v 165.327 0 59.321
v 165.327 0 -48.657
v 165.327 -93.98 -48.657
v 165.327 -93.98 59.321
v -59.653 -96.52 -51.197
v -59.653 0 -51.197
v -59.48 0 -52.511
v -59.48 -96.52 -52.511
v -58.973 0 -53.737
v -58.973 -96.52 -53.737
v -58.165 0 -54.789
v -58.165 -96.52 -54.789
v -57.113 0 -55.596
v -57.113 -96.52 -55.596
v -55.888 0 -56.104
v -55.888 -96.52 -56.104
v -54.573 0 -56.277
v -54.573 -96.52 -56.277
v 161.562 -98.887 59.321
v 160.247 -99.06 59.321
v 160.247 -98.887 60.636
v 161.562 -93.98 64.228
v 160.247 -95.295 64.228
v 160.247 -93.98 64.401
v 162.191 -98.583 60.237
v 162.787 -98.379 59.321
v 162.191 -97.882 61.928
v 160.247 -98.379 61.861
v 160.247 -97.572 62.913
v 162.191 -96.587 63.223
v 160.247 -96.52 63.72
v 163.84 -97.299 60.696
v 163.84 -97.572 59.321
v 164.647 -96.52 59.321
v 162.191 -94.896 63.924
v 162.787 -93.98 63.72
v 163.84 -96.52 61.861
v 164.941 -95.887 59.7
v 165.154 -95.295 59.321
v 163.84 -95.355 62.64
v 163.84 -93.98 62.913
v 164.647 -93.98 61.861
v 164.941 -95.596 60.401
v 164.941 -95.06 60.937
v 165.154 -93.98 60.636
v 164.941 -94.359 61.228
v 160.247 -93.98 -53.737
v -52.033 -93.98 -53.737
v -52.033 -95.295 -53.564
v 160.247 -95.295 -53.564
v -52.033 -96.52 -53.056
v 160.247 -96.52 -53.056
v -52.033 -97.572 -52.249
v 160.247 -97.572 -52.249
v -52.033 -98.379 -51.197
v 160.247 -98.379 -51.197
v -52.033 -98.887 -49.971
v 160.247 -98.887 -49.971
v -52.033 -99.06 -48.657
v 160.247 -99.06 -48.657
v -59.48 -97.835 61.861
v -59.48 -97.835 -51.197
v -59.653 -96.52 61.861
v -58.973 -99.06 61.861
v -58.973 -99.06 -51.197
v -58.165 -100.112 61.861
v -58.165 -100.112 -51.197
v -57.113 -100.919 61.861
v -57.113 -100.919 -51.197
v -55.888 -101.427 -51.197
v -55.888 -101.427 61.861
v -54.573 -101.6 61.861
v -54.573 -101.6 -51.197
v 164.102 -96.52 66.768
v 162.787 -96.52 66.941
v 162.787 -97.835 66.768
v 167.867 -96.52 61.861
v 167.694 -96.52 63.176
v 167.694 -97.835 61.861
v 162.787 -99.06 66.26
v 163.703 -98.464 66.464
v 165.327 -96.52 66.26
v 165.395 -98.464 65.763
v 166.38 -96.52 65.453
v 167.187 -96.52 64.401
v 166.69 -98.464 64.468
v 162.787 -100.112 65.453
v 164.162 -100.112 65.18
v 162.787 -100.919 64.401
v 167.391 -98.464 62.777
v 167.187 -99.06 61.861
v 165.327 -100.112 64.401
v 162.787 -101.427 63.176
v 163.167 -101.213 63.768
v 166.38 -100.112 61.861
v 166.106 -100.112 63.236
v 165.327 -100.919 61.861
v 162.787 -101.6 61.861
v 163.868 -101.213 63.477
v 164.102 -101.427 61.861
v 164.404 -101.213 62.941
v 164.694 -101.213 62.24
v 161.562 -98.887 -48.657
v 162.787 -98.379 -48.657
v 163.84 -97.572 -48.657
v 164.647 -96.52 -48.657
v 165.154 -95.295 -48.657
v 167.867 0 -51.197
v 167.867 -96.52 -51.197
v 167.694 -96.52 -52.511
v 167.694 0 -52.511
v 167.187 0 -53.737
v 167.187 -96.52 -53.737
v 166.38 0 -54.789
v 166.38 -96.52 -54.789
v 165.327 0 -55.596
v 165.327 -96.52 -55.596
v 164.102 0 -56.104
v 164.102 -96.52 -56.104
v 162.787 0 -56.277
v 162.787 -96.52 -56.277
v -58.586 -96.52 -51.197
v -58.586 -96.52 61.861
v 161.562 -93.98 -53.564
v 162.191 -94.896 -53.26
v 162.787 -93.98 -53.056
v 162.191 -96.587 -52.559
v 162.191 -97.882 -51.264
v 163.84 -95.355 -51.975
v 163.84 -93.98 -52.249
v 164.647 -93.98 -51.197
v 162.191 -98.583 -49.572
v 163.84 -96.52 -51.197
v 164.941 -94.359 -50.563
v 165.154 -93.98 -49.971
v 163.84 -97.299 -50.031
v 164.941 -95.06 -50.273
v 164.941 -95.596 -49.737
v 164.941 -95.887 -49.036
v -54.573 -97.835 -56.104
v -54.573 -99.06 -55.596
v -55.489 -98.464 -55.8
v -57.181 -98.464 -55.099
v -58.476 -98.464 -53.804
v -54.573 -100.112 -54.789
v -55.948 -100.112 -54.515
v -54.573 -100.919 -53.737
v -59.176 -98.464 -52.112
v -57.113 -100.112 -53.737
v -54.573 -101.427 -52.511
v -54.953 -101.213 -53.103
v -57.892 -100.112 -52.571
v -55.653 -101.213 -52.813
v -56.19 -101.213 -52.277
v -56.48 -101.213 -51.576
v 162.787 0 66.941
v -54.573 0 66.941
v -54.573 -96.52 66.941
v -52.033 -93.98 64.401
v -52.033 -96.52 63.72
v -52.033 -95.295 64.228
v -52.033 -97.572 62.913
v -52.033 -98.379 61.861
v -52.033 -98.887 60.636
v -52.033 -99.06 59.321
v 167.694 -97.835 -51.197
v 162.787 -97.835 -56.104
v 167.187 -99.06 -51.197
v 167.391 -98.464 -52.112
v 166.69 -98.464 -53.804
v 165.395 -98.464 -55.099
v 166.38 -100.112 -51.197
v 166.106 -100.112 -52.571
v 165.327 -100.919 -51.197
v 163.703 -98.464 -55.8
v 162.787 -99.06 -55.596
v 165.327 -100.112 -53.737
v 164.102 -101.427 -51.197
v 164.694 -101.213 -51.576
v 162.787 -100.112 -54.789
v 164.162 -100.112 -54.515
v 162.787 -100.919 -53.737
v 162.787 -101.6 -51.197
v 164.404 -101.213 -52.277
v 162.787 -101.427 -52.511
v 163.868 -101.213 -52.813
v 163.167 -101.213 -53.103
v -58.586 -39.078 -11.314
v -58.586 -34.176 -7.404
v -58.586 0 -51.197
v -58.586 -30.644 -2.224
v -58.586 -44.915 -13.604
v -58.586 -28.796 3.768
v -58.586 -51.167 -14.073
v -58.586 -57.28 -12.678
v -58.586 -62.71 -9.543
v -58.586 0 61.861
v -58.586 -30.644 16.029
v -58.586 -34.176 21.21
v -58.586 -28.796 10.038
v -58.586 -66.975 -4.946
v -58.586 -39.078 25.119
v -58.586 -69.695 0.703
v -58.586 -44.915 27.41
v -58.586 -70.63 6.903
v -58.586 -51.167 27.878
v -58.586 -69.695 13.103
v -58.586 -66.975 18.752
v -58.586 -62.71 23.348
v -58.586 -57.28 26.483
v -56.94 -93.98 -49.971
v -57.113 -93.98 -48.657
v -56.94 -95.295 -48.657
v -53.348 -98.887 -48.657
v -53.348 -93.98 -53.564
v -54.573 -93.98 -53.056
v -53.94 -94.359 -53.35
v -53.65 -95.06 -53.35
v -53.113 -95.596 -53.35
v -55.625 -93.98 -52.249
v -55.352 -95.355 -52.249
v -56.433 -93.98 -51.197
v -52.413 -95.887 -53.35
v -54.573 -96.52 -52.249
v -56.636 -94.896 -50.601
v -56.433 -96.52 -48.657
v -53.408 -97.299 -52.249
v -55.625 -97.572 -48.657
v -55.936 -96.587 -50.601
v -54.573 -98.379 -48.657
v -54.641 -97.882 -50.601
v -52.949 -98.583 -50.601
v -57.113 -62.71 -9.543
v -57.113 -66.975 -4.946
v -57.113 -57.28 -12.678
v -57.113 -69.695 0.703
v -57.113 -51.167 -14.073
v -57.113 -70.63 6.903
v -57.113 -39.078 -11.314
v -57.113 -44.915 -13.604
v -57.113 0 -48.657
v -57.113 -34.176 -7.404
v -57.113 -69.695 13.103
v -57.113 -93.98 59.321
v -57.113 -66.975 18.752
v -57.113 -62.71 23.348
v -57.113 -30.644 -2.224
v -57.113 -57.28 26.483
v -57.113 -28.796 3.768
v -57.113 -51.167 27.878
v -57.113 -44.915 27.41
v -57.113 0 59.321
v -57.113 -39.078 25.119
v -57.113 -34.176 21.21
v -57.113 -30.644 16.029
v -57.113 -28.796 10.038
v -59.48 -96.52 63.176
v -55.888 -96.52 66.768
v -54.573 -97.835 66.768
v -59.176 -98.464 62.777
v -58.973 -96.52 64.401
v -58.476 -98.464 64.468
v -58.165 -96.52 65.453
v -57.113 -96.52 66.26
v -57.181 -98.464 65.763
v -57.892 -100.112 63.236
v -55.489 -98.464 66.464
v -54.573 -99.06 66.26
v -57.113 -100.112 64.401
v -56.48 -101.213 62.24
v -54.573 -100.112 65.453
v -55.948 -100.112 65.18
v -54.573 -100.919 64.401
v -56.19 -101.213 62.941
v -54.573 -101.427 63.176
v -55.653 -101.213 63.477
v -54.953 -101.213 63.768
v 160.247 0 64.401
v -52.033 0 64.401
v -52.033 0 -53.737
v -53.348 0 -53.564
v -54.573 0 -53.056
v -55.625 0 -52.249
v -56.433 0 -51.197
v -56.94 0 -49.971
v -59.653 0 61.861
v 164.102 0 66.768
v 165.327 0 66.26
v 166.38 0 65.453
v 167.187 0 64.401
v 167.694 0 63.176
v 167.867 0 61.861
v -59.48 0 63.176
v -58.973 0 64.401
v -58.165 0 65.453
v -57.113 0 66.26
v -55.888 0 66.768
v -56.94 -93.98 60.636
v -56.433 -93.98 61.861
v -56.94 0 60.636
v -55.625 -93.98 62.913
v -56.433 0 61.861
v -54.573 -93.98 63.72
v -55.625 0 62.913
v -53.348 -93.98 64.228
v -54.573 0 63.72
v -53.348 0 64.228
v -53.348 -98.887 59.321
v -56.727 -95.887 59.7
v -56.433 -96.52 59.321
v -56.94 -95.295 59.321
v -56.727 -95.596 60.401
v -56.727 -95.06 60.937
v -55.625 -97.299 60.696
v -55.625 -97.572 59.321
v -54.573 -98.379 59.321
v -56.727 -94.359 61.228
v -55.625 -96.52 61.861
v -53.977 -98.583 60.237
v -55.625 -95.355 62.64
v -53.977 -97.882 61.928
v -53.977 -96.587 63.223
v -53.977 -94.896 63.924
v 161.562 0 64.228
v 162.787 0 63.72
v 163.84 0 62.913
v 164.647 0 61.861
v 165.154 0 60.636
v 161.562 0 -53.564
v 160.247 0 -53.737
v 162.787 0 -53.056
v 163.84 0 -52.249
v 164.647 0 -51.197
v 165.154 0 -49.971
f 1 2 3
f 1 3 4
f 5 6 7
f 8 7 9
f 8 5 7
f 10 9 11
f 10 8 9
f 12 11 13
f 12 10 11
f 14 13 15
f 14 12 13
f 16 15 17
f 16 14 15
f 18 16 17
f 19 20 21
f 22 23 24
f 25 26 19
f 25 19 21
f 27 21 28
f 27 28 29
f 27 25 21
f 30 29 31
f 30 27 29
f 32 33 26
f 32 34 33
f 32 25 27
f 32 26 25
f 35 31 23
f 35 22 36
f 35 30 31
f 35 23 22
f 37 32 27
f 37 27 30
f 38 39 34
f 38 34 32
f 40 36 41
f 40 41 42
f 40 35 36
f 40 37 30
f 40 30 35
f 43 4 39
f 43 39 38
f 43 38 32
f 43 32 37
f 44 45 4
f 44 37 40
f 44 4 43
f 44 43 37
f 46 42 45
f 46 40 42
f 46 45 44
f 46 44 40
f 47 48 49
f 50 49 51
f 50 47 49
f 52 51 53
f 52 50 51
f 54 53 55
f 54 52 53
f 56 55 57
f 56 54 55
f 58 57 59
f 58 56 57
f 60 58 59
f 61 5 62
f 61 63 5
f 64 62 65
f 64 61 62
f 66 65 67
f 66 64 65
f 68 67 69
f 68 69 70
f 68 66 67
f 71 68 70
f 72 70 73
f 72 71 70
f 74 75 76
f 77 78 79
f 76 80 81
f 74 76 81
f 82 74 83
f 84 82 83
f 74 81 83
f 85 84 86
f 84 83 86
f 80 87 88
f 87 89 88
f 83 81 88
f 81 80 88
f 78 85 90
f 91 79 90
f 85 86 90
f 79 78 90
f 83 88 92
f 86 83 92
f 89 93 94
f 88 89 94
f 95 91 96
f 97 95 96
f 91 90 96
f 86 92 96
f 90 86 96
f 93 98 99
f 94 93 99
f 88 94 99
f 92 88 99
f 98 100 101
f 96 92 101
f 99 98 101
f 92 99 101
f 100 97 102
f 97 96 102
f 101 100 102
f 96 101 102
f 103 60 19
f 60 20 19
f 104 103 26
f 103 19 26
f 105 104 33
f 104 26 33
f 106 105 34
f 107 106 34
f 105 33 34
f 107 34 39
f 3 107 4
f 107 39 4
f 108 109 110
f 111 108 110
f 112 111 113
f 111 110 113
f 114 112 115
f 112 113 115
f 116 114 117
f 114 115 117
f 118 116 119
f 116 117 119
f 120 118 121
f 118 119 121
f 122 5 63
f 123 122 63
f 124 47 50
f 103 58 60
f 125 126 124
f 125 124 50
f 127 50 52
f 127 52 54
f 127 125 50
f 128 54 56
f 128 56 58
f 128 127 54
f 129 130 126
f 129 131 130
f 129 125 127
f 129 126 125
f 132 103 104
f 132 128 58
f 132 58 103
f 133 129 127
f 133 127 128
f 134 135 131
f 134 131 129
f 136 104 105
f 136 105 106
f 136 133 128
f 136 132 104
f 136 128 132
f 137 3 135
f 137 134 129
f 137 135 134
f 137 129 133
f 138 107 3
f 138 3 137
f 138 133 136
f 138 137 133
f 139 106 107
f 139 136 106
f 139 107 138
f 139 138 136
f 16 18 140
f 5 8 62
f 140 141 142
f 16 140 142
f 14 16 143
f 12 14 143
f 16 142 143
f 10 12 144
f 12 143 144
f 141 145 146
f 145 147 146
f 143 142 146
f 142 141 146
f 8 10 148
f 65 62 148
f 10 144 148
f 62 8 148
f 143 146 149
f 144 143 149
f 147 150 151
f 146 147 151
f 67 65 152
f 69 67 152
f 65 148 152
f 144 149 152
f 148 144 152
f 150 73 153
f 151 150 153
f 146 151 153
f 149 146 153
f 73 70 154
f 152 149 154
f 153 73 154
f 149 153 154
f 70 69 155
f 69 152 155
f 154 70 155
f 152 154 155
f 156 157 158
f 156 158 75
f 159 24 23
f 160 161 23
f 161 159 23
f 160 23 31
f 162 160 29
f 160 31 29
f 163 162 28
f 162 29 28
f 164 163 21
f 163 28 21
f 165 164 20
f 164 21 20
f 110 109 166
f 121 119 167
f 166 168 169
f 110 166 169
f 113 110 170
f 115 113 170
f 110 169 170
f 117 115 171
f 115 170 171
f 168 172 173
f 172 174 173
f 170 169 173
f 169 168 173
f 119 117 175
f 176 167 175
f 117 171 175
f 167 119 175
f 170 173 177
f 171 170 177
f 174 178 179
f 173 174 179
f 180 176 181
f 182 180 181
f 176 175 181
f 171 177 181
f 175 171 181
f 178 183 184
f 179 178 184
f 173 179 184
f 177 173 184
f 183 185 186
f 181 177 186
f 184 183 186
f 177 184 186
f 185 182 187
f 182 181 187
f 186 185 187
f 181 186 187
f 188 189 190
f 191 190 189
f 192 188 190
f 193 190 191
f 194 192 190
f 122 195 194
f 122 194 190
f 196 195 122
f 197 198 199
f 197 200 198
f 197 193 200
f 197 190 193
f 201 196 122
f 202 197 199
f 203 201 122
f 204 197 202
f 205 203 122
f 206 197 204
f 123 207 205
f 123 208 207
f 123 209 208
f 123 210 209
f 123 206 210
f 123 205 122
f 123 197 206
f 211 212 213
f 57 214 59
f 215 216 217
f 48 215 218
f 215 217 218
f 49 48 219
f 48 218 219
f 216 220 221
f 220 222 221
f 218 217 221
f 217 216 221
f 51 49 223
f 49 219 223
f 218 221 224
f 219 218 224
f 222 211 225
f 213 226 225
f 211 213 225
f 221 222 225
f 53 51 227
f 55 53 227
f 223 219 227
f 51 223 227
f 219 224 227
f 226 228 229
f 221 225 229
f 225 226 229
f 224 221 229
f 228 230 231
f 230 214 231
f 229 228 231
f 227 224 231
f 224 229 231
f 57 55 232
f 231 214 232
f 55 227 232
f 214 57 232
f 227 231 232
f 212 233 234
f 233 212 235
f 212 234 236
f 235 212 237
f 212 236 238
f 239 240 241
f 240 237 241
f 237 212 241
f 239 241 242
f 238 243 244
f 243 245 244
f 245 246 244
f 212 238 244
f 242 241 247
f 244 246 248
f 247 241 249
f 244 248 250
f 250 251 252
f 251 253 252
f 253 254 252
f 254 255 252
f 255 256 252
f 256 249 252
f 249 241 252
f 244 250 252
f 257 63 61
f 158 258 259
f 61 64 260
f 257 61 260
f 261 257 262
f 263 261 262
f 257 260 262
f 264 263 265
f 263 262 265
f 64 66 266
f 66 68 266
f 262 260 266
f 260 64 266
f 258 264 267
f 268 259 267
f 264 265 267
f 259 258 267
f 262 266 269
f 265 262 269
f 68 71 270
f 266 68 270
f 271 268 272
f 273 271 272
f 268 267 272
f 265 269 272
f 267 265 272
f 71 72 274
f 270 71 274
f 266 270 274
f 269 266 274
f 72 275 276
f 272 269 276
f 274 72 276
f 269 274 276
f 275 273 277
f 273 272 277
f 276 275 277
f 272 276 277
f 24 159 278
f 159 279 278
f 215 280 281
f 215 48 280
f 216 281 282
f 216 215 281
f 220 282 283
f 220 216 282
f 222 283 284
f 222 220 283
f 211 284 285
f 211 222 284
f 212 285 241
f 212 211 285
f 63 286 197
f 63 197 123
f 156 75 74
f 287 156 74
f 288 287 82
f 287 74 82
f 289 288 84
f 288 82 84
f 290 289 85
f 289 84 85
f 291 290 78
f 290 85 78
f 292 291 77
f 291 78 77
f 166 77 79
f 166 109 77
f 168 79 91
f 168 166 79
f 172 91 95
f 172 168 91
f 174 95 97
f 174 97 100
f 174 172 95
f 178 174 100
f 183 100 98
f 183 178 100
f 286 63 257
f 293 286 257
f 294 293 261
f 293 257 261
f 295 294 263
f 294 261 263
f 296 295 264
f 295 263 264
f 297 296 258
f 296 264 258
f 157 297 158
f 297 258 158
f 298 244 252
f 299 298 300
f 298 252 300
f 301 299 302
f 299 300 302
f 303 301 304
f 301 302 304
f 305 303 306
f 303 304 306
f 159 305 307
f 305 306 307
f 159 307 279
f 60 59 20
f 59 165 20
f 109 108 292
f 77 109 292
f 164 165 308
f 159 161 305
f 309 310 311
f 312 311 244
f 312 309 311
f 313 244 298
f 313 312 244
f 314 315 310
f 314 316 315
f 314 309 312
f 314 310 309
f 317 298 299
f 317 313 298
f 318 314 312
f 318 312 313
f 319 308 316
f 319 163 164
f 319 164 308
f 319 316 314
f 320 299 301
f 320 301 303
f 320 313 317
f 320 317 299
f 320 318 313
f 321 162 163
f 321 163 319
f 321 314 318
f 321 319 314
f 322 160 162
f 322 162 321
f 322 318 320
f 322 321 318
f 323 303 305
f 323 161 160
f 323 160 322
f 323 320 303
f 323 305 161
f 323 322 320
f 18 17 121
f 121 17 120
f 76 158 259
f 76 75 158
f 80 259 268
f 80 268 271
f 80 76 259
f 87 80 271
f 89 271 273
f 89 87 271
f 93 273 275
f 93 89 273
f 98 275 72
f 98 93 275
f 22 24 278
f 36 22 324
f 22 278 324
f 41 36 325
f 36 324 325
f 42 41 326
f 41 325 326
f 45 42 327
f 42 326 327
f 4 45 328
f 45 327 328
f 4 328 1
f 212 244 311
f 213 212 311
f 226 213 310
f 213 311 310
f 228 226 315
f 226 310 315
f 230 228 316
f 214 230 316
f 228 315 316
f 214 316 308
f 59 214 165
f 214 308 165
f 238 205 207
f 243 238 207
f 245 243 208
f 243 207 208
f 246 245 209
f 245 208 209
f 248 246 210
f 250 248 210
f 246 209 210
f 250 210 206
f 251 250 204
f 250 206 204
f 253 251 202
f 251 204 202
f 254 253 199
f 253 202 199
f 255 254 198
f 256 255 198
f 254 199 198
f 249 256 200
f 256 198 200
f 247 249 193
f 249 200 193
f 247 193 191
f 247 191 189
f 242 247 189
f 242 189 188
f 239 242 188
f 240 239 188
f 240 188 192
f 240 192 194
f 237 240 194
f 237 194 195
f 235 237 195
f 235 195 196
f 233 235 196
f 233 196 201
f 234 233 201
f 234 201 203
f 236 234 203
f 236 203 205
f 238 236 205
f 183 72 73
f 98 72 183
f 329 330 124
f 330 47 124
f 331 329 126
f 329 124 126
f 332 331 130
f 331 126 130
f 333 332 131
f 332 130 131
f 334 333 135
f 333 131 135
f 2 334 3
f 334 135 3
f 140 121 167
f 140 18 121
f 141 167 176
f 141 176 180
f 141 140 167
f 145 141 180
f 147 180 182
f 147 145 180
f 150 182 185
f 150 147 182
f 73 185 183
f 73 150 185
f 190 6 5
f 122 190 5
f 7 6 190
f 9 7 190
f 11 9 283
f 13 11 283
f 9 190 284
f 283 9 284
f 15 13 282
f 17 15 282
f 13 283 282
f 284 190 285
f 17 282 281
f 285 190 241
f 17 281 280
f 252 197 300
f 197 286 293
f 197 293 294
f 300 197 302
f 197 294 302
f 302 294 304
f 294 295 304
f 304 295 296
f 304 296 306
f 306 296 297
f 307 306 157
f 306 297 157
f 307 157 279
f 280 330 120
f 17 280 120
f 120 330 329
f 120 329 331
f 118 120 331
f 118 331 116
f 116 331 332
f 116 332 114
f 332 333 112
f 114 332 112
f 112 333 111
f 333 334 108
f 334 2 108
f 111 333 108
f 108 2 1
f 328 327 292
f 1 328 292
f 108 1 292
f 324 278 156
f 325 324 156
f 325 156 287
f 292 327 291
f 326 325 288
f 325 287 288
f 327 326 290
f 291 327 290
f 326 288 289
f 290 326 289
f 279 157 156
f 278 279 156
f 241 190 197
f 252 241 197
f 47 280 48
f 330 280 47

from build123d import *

# Parameters (mm, degrees)
F0_W      = 227.5207936764
F0_H      = 123.2175752521
F1_DEPTH  = 101.6
F2_T      = -2.54
F3_R      = 5.08
F4_R      = 5.08
F5_R      = 5.08
F6_R      = 5.08
F7_R      = 5.08
F8_R      = 5.08
F9_R      = 5.08
F10_R     = 5.08
F11_R     = 5.08
F12_W     = 96.52
F12_H     = 113.0575752521
F12_R     = 21.0345271837
F13_DEPTH = 1.06687
F14_DEPTH = 25.4


with BuildPart() as f1:
    # F0 (on Front) → F1 (new body)
    with BuildSketch(Plane.XZ):
        with Locations((54.1070699692, 5.3321830928)):
            Rectangle(F0_W, F0_H)
    extrude(amount=F1_DEPTH)

    # F2
    f2_openings = [f1.faces().sort_by_distance(p)[0] for p in [
        (54.10707, 0, 5.332183),
    ]]
    offset(amount=F2_T, openings=f2_openings)

    # F3
    f3_edges = [f1.edges().sort_by_distance(p)[0] for p in [
        (54.10707, -99.06, 64.400971),
    ]]
    fillet(f3_edges, radius=F3_R)

    # F4
    f4_edges = [f1.edges().sort_by_distance(p)[0] for p in [
        (-57.113327, -99.06, 2.792183),
    ]]
    fillet(f4_edges, radius=F4_R)

    # F5
    f5_edges = [f1.edges().sort_by_distance(p)[0] for p in [
        (56.64707, -99.06, -53.736605),
    ]]
    fillet(f5_edges, radius=F5_R)

    # F6
    f6_edges = [f1.edges().sort_by_distance(p)[0] for p in [
        (165.327467, -99.06, 5.332183),
    ]]
    fillet(f6_edges, radius=F6_R)

    # F7
    f7_edges = [f1.edges().sort_by_distance(p)[0] for p in [
        (-59.653327, -50.8, 66.940971),
    ]]
    fillet(f7_edges, radius=F7_R)

    # F8
    f8_edges = [f1.edges().sort_by_distance(p)[0] for p in [
        (-59.653327, -50.8, -56.276605),
    ]]
    fillet(f8_edges, radius=F8_R)

    # F9
    f9_edges = [f1.edges().sort_by_distance(p)[0] for p in [
        (167.867467, -50.8, 66.940971),
    ]]
    fillet(f9_edges, radius=F9_R)

    # F10
    f10_edges = [f1.edges().sort_by_distance(p)[0] for p in [
        (162.787467, -50.8, 66.940971),
        (167.867467, -50.8, -56.276605),
    ]]
    fillet(f10_edges, radius=F10_R)

    # F11
    f11_edges = [f1.edges().sort_by_distance(p)[0] for p in [
        (54.10707, -101.6, 66.940971),
    ]]
    fillet(f11_edges, radius=F11_R)

    # F12 (on face) → F13 (cut)
    with BuildSketch(Plane(origin=(-59.653326869, 0, 0), x_dir=(0, -1, 0), z_dir=(-1, 0, 0))):
        with Locations((48.26, 5.3321830928)):
            Rectangle(F12_W, F12_H)
        with Locations((49.5954602957, 6.9027016871)):
            Circle(F12_R, mode=Mode.SUBTRACT)
    extrude(amount=-F13_DEPTH, mode=Mode.SUBTRACT)

    # F14 (cut): a face of the model
    f14_faces = [f1.faces().sort_by_distance(p)[0] for p in [
        (-59.653326869, -49.5954602957, 6.9027016871),
    ]]
    extrude(f14_faces, amount=-F14_DEPTH, mode=Mode.SUBTRACT)


solid = f1.part
